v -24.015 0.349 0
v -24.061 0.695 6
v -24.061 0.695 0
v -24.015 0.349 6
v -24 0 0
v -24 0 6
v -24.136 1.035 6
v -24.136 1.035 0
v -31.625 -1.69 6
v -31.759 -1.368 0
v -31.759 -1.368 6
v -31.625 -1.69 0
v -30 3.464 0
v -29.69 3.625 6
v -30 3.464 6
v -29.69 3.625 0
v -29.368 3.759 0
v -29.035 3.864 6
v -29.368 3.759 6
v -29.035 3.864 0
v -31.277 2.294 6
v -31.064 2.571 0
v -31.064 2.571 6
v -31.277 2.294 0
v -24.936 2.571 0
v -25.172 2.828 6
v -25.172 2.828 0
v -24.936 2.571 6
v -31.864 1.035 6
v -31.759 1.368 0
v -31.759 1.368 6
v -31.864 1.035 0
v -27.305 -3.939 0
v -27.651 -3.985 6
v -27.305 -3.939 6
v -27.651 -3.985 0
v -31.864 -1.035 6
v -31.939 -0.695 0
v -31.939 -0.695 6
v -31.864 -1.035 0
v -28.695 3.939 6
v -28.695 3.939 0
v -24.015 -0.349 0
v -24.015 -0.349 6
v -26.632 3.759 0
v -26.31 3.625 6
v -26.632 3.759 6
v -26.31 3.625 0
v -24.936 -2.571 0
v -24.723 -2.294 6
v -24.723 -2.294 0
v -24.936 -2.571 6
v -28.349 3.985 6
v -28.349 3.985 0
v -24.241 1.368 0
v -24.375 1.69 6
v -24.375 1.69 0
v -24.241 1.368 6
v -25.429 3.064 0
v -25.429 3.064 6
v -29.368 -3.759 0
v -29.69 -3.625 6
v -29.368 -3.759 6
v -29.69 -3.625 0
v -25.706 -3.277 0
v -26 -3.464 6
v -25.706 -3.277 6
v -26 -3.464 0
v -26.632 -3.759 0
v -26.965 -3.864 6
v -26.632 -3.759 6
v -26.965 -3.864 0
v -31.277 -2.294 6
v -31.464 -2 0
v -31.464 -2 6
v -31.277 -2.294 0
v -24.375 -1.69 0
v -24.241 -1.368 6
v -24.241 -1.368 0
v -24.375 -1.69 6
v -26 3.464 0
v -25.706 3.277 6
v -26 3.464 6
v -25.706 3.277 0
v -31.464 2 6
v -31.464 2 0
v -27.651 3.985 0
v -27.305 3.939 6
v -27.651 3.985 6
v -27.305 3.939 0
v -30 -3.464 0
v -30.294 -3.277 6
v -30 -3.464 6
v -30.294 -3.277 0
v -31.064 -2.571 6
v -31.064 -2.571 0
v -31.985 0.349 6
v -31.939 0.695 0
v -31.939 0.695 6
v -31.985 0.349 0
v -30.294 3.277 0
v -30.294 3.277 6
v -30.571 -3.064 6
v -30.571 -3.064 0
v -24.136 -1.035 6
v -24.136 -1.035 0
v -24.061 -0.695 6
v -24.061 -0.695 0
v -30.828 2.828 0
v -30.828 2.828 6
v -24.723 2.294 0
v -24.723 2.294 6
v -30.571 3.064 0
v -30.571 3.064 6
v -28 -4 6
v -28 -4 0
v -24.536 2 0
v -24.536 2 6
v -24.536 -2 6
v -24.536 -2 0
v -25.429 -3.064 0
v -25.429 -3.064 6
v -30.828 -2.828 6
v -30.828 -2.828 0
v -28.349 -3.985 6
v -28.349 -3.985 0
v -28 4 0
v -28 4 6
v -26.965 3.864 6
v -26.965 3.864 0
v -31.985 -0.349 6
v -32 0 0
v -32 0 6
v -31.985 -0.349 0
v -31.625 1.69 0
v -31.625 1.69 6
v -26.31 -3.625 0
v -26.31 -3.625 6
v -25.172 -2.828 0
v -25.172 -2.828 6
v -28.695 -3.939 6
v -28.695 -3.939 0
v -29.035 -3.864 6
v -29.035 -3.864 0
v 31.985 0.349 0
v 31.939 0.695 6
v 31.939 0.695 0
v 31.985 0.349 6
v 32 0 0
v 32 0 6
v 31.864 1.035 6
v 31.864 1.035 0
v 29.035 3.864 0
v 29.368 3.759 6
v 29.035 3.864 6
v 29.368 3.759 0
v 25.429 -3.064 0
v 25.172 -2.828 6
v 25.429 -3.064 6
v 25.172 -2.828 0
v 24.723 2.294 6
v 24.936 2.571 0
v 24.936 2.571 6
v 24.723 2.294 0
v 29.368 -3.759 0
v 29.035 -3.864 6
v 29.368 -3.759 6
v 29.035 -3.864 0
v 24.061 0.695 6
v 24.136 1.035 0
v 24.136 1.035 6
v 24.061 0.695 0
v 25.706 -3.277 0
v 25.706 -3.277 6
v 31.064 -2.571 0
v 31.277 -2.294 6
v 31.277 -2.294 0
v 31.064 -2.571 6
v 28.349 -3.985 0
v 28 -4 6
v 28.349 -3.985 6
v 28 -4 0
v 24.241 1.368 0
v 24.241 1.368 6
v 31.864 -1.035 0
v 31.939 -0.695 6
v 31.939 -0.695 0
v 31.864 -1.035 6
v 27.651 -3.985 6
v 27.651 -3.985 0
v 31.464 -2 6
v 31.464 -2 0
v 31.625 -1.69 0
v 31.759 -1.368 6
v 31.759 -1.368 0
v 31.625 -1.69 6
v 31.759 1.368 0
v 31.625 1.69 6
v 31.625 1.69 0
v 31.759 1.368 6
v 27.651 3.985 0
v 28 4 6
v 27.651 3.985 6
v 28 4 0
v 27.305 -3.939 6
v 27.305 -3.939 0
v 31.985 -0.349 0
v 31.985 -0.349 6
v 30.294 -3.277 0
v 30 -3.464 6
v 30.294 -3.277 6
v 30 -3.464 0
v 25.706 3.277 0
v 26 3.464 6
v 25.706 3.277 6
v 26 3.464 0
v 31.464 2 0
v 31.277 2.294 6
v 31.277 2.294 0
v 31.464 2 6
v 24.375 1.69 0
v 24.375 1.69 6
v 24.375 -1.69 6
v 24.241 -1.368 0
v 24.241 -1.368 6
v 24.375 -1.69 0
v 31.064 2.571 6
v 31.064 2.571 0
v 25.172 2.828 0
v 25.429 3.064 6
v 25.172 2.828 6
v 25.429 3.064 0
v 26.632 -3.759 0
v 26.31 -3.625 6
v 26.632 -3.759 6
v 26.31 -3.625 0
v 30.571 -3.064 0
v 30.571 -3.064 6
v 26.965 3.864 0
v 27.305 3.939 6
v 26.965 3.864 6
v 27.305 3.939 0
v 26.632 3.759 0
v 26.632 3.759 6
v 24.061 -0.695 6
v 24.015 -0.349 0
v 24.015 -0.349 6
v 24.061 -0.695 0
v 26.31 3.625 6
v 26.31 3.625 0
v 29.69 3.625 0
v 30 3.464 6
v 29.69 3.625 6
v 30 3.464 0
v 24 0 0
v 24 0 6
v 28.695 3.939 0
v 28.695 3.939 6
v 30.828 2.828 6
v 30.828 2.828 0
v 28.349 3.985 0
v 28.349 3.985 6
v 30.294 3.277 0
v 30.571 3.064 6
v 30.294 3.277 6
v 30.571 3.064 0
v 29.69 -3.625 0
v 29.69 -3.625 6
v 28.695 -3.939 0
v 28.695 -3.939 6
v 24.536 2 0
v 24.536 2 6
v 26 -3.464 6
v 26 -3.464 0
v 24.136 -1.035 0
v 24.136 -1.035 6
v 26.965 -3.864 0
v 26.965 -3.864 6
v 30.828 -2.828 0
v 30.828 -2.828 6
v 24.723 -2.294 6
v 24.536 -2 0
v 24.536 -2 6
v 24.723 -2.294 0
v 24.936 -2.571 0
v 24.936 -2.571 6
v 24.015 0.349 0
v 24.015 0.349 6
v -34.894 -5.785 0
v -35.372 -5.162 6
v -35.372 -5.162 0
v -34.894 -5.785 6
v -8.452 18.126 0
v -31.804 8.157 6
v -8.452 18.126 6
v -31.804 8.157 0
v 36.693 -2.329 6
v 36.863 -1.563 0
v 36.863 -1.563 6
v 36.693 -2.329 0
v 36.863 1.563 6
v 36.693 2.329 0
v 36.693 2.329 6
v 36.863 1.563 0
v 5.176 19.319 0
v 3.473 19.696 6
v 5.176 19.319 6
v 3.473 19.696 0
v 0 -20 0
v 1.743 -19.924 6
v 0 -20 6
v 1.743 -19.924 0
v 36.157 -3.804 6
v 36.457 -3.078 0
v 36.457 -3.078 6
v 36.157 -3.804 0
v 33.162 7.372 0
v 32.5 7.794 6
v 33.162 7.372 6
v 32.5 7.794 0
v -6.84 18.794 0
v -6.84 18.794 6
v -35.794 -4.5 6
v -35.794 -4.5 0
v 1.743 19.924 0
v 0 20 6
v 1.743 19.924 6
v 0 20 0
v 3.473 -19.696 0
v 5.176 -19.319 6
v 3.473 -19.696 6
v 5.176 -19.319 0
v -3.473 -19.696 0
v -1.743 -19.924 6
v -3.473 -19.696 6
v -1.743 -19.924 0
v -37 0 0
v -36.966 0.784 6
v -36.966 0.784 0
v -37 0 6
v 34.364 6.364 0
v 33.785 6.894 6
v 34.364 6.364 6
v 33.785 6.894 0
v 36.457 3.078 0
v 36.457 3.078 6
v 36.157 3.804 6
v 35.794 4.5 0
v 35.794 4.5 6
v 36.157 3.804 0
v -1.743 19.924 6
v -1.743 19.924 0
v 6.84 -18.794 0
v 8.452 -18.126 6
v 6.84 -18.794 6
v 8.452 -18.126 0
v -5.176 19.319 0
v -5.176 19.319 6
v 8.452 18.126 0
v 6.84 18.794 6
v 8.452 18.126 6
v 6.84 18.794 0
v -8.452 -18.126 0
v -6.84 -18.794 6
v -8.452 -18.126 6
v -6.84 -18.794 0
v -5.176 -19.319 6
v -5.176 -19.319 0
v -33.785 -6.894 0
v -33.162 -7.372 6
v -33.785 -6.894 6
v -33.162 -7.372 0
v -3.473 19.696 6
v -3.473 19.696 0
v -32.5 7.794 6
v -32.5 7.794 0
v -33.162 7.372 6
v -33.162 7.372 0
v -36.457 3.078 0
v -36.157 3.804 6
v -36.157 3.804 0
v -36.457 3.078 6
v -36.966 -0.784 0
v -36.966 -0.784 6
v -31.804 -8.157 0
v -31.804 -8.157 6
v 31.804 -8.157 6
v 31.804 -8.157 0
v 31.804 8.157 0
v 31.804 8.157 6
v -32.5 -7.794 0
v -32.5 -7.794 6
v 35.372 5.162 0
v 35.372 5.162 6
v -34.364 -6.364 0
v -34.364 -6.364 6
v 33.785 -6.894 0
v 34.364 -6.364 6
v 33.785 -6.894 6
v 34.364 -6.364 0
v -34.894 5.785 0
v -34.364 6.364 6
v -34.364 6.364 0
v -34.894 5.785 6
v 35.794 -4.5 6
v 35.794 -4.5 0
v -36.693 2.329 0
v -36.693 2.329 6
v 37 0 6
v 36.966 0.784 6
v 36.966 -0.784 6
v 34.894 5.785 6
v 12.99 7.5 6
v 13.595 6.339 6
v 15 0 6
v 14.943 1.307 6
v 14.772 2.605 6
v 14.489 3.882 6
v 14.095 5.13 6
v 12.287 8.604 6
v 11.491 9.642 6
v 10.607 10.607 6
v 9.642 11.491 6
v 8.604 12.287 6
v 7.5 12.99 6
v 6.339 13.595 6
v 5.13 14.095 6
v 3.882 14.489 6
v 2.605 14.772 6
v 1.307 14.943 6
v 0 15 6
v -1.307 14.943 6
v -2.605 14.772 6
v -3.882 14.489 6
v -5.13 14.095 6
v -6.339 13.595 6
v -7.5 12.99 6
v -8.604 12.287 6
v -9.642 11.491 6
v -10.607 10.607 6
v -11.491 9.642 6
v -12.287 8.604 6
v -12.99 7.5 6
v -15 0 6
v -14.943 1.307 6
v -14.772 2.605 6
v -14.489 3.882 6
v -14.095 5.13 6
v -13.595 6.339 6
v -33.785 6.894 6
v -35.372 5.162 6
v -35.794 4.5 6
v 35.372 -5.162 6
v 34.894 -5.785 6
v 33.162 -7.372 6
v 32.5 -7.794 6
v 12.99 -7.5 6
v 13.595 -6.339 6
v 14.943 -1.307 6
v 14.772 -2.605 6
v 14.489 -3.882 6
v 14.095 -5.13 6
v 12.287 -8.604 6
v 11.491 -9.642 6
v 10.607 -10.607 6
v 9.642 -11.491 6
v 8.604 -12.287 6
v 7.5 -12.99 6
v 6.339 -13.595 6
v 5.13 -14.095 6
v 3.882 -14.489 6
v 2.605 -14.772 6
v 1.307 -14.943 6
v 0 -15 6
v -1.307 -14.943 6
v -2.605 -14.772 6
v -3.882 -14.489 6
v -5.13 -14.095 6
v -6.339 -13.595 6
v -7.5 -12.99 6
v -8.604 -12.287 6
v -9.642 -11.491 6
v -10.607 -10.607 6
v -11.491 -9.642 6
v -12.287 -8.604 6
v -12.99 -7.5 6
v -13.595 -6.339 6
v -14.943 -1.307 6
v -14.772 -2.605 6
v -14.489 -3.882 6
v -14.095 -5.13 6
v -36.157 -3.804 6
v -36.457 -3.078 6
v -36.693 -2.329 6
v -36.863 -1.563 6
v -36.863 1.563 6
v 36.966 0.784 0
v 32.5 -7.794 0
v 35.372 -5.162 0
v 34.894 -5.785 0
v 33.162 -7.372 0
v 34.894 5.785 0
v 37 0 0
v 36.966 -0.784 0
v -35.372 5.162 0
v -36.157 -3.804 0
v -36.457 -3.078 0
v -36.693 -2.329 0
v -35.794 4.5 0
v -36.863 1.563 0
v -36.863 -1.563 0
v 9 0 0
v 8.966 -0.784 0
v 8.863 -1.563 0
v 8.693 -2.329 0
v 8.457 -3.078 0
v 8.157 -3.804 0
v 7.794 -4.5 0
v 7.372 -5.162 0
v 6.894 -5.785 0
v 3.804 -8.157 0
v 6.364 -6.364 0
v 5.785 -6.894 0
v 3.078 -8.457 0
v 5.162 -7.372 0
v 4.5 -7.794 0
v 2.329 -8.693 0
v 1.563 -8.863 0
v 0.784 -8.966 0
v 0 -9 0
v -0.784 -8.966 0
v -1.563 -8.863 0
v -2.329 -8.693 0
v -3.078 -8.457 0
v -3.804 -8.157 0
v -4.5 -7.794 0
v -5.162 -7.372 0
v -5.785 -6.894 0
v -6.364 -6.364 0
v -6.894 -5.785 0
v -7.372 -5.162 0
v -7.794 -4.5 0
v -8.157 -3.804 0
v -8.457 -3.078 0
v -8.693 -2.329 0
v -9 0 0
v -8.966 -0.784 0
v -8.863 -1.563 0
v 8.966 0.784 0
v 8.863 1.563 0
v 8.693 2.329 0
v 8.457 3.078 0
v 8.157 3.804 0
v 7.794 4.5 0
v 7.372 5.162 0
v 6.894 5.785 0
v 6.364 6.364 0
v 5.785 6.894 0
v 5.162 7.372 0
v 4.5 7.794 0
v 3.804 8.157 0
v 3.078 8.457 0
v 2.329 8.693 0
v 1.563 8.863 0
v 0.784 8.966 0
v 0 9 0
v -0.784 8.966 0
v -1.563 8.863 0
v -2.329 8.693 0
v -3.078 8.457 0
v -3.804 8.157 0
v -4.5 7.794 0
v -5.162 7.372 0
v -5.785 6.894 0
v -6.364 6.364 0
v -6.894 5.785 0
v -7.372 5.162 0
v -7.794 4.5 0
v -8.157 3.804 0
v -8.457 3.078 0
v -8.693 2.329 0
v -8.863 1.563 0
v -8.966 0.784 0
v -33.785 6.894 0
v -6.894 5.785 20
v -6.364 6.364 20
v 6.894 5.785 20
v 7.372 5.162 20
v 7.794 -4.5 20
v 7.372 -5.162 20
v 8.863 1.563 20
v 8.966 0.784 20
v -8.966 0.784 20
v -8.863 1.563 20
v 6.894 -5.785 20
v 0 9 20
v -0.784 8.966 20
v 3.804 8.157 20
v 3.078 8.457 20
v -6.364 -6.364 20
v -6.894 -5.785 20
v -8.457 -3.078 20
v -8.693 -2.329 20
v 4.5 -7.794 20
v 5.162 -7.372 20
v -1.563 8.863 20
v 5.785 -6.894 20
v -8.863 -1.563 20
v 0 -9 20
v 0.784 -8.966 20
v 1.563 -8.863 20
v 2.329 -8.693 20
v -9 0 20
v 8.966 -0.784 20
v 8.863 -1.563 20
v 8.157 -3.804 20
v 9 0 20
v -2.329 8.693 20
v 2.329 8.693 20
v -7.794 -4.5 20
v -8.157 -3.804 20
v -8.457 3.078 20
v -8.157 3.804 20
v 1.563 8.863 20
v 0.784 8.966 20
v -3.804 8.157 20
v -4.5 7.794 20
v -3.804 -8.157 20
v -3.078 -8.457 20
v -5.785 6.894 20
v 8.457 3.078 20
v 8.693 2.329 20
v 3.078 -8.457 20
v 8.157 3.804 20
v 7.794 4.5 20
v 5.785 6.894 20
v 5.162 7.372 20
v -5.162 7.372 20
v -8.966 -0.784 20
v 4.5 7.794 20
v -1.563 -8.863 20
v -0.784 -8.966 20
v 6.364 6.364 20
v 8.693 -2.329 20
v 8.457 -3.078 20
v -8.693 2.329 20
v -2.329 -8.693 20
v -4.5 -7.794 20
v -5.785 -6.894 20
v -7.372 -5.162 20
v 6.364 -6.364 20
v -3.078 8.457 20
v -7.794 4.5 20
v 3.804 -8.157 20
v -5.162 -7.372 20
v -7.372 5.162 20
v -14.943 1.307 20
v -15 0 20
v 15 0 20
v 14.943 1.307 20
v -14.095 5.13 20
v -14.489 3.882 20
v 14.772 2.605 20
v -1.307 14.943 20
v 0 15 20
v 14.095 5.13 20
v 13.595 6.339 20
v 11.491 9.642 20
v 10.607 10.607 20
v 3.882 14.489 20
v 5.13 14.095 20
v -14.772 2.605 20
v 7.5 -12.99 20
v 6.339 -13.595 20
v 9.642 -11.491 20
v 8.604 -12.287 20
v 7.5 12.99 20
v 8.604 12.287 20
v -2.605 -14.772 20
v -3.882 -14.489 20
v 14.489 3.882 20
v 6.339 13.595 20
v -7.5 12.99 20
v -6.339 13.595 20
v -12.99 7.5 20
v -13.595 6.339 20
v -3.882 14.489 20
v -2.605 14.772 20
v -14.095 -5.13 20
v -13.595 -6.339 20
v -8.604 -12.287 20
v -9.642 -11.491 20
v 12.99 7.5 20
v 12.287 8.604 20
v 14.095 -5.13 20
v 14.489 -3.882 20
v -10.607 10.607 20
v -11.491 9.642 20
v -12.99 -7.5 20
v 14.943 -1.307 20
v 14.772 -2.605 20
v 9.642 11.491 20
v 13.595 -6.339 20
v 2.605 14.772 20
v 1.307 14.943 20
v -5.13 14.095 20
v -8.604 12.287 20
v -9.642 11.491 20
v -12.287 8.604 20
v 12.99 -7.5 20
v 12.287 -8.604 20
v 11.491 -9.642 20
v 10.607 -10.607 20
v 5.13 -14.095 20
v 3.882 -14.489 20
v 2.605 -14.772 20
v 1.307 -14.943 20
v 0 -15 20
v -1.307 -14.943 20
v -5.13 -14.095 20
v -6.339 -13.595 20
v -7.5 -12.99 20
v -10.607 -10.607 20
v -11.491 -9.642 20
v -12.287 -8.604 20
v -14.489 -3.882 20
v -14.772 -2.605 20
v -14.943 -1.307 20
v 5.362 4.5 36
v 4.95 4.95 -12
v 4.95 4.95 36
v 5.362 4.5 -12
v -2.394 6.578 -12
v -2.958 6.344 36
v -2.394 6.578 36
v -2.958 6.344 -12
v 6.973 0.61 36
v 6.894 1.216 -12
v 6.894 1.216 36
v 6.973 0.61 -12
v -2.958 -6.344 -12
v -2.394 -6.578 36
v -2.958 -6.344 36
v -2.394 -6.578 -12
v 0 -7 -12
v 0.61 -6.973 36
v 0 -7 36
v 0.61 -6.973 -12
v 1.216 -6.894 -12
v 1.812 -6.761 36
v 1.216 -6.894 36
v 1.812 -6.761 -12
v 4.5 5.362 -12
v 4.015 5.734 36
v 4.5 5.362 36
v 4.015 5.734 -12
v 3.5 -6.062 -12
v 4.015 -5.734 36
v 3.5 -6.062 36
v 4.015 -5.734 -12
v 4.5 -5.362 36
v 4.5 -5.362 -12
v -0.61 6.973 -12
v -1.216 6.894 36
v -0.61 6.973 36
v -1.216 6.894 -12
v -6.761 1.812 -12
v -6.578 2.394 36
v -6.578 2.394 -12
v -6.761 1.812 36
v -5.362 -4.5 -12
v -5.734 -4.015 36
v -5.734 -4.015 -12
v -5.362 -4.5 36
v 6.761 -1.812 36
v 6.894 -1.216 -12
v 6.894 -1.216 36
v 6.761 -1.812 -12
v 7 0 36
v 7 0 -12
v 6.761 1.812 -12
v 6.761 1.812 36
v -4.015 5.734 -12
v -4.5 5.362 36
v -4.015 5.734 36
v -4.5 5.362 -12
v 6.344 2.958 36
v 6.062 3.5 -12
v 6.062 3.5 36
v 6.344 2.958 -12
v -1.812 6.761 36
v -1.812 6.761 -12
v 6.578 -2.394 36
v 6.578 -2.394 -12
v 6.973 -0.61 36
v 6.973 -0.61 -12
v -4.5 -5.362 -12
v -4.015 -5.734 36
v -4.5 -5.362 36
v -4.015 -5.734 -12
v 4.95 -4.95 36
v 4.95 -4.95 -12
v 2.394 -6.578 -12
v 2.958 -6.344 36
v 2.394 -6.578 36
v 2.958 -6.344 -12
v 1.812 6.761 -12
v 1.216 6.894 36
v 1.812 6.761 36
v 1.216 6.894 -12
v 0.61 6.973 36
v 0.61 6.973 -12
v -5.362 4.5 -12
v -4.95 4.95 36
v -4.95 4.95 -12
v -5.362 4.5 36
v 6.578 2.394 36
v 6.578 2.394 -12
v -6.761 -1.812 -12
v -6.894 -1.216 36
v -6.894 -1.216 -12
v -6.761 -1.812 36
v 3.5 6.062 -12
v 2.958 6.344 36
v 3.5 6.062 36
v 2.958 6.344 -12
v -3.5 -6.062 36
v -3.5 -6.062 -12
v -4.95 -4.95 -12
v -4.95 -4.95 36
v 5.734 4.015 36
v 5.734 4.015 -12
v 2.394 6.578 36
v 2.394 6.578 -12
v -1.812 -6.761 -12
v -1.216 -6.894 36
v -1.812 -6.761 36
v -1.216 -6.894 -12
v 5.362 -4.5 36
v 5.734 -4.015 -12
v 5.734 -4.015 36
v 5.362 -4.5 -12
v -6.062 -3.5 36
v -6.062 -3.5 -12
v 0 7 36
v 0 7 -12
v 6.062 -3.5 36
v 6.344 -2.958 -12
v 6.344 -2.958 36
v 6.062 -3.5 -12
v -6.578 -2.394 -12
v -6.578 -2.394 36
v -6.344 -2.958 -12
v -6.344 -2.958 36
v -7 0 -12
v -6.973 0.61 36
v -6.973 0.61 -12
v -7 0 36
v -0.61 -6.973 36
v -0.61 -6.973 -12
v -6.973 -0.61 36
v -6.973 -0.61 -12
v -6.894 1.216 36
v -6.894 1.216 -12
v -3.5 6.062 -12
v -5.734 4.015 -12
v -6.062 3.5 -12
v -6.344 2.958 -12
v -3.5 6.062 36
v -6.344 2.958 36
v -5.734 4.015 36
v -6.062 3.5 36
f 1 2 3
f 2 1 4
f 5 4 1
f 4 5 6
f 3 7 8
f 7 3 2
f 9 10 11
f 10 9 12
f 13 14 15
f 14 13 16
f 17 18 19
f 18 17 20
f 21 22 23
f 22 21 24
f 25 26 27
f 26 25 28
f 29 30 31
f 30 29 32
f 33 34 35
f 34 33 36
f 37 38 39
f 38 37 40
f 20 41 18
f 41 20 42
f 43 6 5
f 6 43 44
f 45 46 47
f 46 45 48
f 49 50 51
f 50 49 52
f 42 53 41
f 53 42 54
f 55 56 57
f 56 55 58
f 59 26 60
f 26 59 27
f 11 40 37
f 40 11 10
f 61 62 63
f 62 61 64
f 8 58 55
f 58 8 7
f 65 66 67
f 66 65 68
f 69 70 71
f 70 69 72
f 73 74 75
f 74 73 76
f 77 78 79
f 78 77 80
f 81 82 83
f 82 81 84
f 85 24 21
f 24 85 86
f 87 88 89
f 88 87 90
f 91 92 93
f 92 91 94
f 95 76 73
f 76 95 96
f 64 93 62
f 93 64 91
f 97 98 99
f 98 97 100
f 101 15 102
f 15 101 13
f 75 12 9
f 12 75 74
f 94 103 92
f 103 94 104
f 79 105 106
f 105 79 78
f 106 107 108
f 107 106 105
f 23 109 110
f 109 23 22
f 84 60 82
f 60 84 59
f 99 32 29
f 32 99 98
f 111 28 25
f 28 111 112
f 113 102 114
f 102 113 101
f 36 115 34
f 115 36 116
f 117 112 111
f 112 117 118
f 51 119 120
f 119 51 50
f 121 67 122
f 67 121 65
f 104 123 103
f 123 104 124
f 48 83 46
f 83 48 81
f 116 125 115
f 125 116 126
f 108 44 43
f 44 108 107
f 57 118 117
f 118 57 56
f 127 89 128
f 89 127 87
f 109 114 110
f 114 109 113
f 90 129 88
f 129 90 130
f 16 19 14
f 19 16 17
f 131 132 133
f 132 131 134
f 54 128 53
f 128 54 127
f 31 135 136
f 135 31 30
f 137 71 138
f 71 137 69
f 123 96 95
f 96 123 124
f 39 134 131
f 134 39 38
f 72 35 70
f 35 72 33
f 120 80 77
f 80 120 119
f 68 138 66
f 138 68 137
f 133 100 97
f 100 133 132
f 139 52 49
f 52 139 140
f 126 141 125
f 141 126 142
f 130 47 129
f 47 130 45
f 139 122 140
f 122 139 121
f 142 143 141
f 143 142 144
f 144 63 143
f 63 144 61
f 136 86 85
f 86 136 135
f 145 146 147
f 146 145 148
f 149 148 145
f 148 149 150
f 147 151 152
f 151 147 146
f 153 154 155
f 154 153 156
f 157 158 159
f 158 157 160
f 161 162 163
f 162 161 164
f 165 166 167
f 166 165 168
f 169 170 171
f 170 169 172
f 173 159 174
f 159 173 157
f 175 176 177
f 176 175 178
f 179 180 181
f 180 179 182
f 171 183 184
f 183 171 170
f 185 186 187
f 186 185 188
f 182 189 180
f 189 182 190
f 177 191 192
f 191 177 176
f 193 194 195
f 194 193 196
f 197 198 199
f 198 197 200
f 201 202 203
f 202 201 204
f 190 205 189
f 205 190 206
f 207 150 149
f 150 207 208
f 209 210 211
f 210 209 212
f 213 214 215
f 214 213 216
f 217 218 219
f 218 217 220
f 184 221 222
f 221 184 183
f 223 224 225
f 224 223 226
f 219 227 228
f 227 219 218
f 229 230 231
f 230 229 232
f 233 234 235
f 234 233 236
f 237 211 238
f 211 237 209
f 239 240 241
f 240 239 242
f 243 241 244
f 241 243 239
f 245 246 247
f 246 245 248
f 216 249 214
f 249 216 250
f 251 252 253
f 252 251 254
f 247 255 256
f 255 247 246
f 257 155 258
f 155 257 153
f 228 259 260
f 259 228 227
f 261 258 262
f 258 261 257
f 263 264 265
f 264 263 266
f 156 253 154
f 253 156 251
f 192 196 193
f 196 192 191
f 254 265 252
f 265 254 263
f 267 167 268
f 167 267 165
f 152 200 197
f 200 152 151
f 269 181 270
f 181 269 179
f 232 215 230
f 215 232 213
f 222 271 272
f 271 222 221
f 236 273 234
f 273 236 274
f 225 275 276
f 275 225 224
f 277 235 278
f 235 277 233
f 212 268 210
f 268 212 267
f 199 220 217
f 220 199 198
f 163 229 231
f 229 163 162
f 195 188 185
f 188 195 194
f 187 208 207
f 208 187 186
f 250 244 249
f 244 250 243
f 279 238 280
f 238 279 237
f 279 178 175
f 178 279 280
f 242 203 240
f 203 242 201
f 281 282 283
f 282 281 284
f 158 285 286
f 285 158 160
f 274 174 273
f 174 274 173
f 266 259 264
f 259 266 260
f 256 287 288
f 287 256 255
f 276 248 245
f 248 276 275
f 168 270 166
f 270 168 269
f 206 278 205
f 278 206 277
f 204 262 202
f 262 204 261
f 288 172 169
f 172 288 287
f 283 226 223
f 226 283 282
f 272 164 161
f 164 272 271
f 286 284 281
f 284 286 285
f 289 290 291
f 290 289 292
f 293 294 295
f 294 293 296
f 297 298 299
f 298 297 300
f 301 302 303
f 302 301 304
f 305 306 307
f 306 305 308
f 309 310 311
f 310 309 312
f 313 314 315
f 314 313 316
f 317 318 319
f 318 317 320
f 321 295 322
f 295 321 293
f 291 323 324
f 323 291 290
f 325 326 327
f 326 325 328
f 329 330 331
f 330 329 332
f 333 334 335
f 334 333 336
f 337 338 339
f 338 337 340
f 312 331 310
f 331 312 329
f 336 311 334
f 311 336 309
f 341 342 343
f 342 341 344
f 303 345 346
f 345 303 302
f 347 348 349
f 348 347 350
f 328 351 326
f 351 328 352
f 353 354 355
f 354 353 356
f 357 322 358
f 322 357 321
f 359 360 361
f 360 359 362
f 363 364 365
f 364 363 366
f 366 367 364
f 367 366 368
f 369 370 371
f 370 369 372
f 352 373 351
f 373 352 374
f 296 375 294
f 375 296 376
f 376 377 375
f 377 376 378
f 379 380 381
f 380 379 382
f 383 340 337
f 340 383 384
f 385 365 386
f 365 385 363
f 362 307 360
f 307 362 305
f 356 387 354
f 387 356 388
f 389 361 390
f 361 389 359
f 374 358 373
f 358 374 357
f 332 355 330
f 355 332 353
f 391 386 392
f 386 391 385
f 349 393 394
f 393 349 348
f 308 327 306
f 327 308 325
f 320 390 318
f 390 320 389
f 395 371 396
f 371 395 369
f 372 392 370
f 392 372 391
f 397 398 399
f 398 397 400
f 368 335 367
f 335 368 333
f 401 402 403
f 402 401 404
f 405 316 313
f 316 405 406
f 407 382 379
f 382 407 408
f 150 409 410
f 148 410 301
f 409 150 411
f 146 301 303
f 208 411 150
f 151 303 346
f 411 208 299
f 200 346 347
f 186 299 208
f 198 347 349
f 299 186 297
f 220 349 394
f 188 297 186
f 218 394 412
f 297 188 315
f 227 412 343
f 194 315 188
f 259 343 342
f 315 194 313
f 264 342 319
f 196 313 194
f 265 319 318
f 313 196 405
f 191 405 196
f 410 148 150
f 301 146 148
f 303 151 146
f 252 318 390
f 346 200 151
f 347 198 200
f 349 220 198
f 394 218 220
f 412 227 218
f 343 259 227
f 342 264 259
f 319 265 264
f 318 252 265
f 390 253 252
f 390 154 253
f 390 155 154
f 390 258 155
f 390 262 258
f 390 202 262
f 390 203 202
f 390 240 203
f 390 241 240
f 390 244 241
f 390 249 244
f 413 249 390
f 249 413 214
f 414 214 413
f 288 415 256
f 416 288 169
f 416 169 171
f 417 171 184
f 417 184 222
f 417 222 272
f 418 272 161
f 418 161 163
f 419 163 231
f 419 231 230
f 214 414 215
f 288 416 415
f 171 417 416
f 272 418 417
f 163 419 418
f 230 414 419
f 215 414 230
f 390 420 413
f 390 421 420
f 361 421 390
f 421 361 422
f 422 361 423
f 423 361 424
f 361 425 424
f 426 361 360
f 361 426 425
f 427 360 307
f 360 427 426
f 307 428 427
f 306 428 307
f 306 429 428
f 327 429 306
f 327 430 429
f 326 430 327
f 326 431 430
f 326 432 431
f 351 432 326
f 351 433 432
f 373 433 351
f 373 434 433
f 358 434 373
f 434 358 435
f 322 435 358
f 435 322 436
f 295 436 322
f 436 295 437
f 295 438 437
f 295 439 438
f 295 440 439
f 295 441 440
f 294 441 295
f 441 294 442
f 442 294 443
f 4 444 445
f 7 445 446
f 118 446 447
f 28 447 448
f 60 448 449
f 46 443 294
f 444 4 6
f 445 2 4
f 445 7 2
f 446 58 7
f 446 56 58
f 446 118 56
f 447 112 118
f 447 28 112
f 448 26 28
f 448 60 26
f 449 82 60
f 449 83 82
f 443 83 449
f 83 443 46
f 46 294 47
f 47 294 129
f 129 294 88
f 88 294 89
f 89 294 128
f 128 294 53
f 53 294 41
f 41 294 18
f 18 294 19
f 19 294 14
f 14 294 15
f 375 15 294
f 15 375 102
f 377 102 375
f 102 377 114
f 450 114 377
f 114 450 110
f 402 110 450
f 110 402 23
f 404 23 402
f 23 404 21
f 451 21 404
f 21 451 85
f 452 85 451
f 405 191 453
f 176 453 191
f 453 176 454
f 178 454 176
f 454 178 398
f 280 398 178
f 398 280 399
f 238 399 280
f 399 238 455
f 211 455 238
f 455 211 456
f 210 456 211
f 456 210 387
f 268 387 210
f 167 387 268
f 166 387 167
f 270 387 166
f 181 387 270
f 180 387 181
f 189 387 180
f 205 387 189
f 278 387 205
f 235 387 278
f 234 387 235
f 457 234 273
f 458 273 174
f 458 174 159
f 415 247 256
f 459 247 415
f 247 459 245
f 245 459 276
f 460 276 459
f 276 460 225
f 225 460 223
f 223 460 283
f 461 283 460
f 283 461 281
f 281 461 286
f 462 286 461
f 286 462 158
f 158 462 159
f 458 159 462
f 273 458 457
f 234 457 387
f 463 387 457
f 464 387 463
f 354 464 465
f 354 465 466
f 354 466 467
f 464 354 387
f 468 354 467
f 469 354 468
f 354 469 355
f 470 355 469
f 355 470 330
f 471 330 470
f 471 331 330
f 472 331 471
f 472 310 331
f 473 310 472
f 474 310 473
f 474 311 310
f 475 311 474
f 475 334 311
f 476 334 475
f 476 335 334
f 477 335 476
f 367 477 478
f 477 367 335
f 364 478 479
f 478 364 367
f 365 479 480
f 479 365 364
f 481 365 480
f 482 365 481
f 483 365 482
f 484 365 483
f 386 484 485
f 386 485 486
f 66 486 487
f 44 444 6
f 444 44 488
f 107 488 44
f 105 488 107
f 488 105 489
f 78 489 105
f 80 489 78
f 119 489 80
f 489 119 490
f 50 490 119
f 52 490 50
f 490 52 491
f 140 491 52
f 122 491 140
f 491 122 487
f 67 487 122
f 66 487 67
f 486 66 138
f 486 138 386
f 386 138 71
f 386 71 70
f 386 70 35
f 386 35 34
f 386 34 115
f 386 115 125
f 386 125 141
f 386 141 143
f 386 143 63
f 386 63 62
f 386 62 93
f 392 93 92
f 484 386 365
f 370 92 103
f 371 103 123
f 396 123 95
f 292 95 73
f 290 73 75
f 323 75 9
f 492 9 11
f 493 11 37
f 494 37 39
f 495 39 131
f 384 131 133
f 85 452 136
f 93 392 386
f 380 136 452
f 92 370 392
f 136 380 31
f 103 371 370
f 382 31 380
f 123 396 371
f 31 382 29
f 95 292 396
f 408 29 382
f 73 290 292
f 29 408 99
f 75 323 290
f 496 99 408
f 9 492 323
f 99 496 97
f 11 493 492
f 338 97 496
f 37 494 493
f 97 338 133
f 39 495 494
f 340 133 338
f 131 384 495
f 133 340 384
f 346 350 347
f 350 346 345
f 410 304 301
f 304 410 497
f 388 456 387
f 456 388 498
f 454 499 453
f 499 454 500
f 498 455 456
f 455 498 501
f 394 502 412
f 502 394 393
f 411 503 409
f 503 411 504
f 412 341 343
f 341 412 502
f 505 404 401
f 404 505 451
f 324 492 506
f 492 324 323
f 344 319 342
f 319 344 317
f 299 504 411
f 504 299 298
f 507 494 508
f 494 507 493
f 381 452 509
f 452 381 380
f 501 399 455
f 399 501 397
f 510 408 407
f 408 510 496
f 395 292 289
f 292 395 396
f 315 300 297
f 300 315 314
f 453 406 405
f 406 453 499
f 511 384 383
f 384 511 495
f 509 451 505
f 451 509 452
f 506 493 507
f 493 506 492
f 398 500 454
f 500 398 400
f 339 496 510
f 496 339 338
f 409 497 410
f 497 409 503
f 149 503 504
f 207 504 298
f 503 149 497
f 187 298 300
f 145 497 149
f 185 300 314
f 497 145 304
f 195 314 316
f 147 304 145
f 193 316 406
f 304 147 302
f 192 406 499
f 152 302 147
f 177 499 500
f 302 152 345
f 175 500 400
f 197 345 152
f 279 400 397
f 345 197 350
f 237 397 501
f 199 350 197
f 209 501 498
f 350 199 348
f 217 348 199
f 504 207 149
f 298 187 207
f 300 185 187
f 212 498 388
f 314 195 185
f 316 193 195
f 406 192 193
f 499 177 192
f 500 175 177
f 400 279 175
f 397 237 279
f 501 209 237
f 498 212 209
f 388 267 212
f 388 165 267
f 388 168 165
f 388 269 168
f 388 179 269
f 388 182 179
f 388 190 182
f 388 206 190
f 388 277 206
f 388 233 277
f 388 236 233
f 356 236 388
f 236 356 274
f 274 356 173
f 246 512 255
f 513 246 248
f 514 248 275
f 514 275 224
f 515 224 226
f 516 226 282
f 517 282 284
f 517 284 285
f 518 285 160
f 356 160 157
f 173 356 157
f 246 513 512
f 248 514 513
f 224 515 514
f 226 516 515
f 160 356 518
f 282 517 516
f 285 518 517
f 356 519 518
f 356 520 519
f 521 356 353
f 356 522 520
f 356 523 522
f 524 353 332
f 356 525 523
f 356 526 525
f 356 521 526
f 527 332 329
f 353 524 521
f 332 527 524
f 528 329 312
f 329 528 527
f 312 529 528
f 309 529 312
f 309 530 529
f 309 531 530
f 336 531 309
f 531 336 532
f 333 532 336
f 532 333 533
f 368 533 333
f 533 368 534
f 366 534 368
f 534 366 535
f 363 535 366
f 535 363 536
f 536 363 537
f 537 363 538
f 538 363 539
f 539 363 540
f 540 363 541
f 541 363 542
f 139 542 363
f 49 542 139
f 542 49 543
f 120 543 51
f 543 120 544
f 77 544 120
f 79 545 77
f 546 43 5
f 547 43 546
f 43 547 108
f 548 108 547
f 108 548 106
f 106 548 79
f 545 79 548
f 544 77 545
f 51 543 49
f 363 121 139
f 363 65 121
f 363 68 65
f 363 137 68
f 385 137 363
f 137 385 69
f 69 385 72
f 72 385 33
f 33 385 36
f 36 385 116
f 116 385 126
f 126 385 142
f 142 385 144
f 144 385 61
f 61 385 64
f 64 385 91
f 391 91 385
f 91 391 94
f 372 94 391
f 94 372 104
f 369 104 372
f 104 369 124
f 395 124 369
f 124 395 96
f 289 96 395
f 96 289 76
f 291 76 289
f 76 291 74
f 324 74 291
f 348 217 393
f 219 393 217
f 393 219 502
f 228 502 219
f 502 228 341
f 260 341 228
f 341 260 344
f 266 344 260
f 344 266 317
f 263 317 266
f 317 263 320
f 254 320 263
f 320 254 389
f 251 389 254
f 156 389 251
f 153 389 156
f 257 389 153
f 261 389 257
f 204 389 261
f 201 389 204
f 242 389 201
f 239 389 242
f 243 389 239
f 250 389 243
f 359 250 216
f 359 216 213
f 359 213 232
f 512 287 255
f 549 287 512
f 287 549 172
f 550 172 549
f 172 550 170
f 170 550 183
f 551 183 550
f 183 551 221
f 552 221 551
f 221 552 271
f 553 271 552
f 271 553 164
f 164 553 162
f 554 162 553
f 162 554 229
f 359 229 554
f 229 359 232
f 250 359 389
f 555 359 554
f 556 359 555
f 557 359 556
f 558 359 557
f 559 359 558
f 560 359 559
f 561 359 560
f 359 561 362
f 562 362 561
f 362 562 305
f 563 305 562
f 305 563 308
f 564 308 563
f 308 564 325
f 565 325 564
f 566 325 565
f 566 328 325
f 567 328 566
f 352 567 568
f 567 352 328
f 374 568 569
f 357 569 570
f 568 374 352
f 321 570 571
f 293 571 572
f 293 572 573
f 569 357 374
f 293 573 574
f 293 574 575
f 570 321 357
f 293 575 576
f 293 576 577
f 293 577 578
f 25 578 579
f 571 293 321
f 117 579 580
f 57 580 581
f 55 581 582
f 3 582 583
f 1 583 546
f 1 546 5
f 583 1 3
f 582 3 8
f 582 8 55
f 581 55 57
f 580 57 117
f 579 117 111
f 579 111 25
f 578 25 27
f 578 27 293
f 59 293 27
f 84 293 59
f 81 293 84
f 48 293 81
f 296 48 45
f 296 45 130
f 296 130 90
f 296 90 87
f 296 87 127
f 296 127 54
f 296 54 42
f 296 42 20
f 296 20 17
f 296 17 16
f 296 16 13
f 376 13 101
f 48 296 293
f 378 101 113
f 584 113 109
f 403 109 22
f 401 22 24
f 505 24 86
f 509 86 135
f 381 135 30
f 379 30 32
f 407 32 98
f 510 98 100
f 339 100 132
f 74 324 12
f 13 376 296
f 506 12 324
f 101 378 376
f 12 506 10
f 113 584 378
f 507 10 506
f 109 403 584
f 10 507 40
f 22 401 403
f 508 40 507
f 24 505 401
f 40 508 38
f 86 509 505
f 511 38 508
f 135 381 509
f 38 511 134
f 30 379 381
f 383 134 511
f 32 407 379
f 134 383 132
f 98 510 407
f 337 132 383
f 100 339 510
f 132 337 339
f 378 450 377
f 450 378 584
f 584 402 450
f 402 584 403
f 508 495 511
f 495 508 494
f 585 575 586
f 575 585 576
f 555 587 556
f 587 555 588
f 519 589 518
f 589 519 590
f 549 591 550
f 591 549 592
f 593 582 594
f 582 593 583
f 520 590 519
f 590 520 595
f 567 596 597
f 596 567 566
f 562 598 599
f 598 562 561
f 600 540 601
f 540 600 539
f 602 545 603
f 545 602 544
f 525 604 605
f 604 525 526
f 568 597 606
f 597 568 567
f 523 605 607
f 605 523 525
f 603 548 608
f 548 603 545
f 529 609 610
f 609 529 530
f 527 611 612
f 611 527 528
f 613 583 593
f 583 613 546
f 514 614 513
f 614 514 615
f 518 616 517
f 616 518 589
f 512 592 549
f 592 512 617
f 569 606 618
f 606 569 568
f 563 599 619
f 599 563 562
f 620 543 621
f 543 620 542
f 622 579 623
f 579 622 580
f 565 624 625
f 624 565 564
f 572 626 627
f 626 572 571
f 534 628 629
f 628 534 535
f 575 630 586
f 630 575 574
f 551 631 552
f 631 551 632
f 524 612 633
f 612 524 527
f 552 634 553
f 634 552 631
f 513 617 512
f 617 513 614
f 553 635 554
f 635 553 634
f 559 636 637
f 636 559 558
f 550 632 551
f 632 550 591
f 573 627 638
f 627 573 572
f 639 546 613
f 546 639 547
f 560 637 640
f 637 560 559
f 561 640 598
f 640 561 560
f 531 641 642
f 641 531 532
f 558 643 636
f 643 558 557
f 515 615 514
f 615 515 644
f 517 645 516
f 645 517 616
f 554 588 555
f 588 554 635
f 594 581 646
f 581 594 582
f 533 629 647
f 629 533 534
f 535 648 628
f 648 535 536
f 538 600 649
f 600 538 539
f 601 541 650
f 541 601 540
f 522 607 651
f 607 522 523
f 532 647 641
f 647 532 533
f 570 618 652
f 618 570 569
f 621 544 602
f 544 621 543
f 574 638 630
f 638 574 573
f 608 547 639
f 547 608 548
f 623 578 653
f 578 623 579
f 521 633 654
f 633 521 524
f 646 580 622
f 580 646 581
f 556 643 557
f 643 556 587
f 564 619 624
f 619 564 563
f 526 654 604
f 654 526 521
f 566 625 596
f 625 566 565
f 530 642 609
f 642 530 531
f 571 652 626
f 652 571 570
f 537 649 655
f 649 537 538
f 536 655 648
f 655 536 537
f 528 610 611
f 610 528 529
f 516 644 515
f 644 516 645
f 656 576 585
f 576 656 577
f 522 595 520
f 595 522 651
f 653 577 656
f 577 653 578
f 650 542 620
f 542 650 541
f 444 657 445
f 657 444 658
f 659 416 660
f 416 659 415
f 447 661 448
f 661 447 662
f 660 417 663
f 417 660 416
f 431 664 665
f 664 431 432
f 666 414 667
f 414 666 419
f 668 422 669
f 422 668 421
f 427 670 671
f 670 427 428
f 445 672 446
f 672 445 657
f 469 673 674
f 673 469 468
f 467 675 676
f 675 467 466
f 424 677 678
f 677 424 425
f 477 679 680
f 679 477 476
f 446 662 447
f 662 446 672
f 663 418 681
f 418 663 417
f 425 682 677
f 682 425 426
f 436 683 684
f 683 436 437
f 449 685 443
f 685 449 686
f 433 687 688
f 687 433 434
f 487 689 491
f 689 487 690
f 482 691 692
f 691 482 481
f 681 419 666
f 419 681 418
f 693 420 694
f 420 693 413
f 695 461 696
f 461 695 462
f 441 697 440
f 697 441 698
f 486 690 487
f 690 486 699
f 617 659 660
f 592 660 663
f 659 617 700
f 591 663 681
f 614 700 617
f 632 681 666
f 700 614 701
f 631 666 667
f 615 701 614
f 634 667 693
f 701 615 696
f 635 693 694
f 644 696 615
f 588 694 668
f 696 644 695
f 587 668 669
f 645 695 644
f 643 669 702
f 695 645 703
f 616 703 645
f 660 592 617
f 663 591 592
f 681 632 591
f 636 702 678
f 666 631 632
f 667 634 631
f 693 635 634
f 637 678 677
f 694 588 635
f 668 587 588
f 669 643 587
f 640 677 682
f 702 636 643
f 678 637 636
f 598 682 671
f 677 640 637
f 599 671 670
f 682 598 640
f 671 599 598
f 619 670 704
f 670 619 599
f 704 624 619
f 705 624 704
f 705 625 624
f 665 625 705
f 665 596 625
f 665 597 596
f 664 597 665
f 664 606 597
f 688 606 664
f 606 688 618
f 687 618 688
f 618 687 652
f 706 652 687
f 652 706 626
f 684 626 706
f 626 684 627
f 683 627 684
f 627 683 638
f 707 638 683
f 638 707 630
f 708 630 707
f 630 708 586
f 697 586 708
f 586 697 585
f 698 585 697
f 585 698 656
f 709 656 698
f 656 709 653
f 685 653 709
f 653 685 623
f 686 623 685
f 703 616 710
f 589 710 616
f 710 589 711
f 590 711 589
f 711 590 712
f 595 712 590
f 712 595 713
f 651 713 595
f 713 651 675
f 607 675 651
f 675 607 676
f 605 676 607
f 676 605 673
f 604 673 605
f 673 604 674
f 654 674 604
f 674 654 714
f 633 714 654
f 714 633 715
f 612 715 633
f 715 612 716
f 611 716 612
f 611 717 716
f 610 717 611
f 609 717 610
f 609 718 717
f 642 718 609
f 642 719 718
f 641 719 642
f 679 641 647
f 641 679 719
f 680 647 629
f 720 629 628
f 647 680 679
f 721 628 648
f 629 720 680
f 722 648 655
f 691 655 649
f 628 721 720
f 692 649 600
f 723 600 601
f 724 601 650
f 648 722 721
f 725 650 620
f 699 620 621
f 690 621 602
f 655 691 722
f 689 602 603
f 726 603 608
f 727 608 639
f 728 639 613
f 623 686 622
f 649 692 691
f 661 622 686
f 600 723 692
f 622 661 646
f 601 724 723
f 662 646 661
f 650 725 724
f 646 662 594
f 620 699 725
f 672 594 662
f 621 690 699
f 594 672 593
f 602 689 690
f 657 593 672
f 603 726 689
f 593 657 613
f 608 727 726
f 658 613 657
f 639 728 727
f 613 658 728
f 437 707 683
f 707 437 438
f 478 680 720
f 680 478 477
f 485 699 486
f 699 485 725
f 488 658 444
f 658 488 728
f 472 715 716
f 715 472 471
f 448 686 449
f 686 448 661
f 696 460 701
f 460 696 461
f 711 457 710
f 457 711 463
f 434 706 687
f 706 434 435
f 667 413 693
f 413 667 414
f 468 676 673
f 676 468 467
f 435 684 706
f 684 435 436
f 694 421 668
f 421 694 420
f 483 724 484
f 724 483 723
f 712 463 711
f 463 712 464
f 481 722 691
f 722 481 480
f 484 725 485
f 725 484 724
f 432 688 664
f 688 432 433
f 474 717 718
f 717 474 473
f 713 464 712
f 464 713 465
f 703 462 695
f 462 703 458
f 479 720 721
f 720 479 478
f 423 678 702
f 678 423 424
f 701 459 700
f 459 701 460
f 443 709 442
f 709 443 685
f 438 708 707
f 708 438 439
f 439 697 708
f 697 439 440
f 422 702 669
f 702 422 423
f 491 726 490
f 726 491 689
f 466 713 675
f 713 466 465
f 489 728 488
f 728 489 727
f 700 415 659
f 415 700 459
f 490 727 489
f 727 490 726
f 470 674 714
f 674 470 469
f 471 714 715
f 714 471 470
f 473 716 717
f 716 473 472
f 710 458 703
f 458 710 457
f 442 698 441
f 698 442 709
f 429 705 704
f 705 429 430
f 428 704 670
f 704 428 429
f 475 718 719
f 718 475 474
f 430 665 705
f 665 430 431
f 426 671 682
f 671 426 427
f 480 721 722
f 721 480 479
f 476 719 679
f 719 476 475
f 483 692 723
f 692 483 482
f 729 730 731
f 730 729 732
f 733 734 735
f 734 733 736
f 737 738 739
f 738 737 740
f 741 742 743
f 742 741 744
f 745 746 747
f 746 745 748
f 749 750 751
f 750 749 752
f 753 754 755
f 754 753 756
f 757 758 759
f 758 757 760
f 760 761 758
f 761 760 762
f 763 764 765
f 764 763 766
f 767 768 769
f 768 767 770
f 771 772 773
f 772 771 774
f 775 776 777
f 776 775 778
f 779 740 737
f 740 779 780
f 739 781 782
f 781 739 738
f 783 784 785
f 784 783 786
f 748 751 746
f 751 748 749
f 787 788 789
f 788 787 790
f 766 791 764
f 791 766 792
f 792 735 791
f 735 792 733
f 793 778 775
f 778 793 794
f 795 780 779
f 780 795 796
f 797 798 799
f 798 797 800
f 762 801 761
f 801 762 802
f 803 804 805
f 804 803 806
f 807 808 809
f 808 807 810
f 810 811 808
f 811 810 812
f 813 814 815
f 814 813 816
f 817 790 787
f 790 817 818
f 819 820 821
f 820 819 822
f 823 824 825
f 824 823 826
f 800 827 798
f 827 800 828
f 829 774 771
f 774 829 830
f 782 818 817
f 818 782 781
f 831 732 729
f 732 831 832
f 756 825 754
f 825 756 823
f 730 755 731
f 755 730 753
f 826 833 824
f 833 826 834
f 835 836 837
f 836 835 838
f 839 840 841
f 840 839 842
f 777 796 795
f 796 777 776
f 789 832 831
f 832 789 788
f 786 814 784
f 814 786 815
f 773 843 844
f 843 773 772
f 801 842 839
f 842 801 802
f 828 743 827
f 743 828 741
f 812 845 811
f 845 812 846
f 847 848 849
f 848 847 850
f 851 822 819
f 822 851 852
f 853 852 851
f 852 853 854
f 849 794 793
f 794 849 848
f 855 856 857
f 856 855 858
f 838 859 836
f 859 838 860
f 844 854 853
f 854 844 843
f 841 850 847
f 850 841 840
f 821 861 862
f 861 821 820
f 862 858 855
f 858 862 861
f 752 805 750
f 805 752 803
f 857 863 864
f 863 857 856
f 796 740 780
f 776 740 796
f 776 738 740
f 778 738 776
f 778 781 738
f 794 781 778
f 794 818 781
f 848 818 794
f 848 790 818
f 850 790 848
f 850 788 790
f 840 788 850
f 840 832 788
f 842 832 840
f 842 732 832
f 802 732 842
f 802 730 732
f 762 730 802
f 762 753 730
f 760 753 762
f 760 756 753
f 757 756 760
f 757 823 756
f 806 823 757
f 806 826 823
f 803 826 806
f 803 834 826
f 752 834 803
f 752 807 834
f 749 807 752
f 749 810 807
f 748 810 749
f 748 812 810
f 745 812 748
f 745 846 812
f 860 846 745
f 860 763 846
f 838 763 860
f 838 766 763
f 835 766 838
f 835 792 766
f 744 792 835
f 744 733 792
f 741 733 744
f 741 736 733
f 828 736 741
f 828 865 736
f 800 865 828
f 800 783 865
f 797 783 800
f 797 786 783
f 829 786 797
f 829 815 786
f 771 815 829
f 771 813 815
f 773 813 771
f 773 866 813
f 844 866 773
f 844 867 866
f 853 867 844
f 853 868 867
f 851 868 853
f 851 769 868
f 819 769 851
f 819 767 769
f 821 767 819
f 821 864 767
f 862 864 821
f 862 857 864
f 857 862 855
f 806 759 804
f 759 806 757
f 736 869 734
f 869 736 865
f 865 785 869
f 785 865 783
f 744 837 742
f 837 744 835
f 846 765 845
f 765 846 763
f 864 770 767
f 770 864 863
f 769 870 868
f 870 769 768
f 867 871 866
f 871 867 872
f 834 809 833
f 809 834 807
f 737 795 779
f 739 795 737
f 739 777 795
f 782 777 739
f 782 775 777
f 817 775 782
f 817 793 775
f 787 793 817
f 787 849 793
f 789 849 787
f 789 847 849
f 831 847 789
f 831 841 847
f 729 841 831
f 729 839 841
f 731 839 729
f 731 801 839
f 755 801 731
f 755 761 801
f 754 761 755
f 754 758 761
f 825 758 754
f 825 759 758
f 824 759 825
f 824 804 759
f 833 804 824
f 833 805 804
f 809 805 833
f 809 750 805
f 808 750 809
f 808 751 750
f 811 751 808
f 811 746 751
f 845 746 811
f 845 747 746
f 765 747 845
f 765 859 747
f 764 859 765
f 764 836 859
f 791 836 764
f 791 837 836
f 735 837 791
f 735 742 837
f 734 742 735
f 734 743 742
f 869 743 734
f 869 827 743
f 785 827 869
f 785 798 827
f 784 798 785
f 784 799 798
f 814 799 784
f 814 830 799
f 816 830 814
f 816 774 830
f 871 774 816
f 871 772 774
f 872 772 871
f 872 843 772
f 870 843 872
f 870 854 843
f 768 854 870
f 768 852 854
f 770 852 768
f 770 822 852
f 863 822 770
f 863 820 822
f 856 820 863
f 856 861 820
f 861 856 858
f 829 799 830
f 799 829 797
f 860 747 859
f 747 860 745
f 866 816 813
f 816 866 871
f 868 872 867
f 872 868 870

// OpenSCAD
// The OpenSCAD card of hero.svg: a flanged bearing housing on a shaft.
$fn = 72;
$vpd = 185;      // a close camera, so the part fills its card
$vpt = [0, 3, 14];

// Two-hole flange: the hull of a center disk and two ears, drilled
module flange() {
    color("#f59e0b") difference() {
        hull() {
            cylinder(r = 20, h = 6);
            for (x = [-28, 28]) translate([x, 0, 0]) cylinder(r = 9, h = 6);
        }
        for (x = [-28, 28]) translate([x, 0, -1]) cylinder(r = 4, h = 8);
        translate([0, 0, -1]) cylinder(r = 9, h = 8);
    }
}

// Raised boss around the bore
module boss() {
    color("#fbbf24") difference() {
        cylinder(r = 15, h = 20);
        translate([0, 0, -1]) cylinder(r = 9, h = 22);
    }
}

// The shaft through the bore
module shaft() {
    color("#38bdf8") translate([0, 0, -12]) cylinder(r = 7, h = 48);
}

flange();
boss();
shaft();
